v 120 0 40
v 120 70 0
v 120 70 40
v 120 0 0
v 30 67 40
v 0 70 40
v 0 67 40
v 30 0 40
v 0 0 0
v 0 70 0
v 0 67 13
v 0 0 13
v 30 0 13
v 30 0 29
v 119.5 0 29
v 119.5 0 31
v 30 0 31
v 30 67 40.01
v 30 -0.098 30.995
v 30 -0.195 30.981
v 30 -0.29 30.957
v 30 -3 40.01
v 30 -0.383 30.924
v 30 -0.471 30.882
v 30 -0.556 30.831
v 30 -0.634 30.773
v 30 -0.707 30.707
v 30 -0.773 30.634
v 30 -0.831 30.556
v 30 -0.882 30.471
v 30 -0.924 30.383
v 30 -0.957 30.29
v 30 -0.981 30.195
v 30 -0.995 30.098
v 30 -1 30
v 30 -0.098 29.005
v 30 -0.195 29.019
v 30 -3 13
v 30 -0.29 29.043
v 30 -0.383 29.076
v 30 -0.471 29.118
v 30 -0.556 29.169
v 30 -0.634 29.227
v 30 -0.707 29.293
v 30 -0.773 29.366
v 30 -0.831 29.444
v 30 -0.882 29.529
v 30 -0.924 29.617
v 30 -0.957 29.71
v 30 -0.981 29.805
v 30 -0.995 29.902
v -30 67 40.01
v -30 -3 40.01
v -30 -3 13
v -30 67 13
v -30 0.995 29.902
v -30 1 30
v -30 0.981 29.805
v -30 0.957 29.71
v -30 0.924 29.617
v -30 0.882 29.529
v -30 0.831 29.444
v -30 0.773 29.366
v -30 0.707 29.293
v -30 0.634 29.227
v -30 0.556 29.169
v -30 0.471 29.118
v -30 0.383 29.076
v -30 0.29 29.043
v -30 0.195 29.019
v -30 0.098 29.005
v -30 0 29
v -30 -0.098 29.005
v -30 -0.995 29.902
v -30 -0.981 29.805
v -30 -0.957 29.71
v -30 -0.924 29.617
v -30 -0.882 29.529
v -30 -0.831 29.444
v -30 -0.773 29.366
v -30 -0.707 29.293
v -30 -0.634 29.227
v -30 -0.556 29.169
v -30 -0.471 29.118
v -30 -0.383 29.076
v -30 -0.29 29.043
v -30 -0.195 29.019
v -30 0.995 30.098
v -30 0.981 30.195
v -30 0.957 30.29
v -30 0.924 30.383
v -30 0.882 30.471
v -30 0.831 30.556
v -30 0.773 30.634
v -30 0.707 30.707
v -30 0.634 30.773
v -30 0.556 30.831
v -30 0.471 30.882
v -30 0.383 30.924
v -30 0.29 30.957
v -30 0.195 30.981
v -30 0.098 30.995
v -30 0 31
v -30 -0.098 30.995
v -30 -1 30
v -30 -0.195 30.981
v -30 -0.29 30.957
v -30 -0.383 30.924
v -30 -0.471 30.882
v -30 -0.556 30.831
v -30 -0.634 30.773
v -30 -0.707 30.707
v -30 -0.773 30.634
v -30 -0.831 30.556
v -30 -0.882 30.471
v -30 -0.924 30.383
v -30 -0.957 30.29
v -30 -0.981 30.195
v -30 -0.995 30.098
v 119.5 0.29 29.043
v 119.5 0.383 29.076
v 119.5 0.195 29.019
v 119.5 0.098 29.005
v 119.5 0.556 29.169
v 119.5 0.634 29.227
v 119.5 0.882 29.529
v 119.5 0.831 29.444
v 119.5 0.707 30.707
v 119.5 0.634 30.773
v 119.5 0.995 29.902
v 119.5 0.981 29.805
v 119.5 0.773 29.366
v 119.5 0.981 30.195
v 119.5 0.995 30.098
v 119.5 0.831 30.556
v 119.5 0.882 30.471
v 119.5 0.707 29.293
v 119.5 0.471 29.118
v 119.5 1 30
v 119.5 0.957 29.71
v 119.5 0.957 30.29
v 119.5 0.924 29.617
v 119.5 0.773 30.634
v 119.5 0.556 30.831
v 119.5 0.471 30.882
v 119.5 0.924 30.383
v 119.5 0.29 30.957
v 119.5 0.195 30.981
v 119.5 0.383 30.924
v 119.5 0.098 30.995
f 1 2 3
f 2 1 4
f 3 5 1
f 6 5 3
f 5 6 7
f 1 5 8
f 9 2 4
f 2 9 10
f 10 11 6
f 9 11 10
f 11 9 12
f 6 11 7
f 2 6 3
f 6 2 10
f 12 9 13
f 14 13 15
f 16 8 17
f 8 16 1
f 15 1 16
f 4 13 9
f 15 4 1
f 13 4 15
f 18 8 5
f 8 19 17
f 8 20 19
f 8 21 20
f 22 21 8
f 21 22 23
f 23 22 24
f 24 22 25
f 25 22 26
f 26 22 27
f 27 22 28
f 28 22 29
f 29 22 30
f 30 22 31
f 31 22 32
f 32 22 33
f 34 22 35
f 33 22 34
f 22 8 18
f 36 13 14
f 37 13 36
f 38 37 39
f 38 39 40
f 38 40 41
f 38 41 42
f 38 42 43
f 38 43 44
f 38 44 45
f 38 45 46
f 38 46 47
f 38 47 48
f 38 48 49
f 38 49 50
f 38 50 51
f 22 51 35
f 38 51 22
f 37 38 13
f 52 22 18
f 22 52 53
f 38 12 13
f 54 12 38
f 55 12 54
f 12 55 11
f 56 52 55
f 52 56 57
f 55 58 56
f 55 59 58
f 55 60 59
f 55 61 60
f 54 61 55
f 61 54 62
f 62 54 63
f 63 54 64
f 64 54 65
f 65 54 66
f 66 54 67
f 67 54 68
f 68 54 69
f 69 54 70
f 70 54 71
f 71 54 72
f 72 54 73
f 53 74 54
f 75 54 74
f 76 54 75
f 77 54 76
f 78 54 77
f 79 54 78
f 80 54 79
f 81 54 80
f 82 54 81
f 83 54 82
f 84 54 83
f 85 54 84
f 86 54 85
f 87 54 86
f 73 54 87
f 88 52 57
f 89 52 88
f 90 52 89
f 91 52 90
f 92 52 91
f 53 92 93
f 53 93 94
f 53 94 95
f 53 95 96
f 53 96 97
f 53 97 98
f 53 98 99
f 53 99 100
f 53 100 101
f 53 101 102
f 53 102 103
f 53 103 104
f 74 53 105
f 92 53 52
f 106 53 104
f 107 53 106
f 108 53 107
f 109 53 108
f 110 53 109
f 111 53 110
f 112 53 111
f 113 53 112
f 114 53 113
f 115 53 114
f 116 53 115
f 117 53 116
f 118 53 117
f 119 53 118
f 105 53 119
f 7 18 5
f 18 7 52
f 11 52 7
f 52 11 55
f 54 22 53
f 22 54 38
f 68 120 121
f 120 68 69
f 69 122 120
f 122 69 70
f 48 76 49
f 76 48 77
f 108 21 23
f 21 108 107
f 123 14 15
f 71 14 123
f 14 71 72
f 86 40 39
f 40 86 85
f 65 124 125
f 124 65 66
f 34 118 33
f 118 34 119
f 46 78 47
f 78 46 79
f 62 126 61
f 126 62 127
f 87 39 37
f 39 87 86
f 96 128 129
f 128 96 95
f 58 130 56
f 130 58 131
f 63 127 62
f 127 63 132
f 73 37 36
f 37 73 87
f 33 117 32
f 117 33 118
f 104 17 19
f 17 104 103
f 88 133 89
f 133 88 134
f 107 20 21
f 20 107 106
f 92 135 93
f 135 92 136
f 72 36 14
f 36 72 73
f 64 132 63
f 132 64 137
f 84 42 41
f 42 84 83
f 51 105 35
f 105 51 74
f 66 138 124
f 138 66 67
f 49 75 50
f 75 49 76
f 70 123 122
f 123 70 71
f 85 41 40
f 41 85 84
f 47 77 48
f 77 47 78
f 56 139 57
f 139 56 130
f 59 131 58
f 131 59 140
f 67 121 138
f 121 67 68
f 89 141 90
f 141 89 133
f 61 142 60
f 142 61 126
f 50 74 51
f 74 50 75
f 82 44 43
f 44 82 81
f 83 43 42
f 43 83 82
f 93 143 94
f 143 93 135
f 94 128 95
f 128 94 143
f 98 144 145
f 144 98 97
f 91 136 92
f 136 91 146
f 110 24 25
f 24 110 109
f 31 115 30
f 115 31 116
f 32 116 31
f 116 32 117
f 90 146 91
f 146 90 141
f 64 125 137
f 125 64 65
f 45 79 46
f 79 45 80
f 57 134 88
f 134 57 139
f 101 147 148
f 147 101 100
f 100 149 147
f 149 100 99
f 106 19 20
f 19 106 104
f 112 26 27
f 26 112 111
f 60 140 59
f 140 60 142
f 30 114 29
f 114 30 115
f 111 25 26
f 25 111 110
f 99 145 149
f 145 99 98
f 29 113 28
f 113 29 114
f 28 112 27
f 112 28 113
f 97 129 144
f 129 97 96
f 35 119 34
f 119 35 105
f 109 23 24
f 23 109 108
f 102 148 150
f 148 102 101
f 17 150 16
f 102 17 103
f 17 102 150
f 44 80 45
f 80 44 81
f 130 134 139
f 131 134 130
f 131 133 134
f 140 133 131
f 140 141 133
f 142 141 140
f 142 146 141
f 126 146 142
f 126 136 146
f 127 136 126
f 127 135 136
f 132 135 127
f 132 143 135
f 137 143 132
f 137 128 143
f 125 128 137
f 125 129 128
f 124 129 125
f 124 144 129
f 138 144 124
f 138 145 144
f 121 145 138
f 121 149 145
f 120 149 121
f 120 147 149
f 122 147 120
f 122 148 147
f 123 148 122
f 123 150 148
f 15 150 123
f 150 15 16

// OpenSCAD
// Mini horizontal gel-electrophoresis box - buffer tank
// Print orientation: tank resting on XY plane, building up +Z

$fn = 64;

// ---- Tank dimensions ----
outer_x = 120;   // outer length in X
outer_y = 70;    // outer width in Y
outer_z = 40;    // outer height in Z
wall    = 3;     // wall thickness
floor   = 3;     // floor thickness

// ---- Platform dimensions ----
plat_x = 60;     // platform length in X (centred)
plat_y = outer_y; // platform spans full inner width
plat_top_z = 13; // top of platform above outer zero

// ---- Electrode holes ----
hole_d = 2;      // hole diameter
hole_y = 0;      // hole Y position
hole_z = 30;     // hole Z position

// ---- Derived ----
inner_x = outer_x - 2*wall;
inner_z = outer_z - wall; // inner floor is at z = floor

eps = 0.5;       // cutter overshoot

difference() {
    union() {
        // Tank body
        cube([outer_x, outer_y, outer_z]);
        // Raised platform (overlaps walls to fuse)
        translate([-plat_x/2, -wall, plat_top_z])
            cube([plat_x, plat_y, outer_z - plat_top_z + 0.01]);
    }
    // Electrode holes through end walls along X
    for (sx = [-1, 1])
        translate([sx * (outer_x/2 - 1), hole_y, hole_z])
            rotate([0, 90, 0])
                cylinder(d = hole_d, h = outer_x + 2*eps, center = true);
}
